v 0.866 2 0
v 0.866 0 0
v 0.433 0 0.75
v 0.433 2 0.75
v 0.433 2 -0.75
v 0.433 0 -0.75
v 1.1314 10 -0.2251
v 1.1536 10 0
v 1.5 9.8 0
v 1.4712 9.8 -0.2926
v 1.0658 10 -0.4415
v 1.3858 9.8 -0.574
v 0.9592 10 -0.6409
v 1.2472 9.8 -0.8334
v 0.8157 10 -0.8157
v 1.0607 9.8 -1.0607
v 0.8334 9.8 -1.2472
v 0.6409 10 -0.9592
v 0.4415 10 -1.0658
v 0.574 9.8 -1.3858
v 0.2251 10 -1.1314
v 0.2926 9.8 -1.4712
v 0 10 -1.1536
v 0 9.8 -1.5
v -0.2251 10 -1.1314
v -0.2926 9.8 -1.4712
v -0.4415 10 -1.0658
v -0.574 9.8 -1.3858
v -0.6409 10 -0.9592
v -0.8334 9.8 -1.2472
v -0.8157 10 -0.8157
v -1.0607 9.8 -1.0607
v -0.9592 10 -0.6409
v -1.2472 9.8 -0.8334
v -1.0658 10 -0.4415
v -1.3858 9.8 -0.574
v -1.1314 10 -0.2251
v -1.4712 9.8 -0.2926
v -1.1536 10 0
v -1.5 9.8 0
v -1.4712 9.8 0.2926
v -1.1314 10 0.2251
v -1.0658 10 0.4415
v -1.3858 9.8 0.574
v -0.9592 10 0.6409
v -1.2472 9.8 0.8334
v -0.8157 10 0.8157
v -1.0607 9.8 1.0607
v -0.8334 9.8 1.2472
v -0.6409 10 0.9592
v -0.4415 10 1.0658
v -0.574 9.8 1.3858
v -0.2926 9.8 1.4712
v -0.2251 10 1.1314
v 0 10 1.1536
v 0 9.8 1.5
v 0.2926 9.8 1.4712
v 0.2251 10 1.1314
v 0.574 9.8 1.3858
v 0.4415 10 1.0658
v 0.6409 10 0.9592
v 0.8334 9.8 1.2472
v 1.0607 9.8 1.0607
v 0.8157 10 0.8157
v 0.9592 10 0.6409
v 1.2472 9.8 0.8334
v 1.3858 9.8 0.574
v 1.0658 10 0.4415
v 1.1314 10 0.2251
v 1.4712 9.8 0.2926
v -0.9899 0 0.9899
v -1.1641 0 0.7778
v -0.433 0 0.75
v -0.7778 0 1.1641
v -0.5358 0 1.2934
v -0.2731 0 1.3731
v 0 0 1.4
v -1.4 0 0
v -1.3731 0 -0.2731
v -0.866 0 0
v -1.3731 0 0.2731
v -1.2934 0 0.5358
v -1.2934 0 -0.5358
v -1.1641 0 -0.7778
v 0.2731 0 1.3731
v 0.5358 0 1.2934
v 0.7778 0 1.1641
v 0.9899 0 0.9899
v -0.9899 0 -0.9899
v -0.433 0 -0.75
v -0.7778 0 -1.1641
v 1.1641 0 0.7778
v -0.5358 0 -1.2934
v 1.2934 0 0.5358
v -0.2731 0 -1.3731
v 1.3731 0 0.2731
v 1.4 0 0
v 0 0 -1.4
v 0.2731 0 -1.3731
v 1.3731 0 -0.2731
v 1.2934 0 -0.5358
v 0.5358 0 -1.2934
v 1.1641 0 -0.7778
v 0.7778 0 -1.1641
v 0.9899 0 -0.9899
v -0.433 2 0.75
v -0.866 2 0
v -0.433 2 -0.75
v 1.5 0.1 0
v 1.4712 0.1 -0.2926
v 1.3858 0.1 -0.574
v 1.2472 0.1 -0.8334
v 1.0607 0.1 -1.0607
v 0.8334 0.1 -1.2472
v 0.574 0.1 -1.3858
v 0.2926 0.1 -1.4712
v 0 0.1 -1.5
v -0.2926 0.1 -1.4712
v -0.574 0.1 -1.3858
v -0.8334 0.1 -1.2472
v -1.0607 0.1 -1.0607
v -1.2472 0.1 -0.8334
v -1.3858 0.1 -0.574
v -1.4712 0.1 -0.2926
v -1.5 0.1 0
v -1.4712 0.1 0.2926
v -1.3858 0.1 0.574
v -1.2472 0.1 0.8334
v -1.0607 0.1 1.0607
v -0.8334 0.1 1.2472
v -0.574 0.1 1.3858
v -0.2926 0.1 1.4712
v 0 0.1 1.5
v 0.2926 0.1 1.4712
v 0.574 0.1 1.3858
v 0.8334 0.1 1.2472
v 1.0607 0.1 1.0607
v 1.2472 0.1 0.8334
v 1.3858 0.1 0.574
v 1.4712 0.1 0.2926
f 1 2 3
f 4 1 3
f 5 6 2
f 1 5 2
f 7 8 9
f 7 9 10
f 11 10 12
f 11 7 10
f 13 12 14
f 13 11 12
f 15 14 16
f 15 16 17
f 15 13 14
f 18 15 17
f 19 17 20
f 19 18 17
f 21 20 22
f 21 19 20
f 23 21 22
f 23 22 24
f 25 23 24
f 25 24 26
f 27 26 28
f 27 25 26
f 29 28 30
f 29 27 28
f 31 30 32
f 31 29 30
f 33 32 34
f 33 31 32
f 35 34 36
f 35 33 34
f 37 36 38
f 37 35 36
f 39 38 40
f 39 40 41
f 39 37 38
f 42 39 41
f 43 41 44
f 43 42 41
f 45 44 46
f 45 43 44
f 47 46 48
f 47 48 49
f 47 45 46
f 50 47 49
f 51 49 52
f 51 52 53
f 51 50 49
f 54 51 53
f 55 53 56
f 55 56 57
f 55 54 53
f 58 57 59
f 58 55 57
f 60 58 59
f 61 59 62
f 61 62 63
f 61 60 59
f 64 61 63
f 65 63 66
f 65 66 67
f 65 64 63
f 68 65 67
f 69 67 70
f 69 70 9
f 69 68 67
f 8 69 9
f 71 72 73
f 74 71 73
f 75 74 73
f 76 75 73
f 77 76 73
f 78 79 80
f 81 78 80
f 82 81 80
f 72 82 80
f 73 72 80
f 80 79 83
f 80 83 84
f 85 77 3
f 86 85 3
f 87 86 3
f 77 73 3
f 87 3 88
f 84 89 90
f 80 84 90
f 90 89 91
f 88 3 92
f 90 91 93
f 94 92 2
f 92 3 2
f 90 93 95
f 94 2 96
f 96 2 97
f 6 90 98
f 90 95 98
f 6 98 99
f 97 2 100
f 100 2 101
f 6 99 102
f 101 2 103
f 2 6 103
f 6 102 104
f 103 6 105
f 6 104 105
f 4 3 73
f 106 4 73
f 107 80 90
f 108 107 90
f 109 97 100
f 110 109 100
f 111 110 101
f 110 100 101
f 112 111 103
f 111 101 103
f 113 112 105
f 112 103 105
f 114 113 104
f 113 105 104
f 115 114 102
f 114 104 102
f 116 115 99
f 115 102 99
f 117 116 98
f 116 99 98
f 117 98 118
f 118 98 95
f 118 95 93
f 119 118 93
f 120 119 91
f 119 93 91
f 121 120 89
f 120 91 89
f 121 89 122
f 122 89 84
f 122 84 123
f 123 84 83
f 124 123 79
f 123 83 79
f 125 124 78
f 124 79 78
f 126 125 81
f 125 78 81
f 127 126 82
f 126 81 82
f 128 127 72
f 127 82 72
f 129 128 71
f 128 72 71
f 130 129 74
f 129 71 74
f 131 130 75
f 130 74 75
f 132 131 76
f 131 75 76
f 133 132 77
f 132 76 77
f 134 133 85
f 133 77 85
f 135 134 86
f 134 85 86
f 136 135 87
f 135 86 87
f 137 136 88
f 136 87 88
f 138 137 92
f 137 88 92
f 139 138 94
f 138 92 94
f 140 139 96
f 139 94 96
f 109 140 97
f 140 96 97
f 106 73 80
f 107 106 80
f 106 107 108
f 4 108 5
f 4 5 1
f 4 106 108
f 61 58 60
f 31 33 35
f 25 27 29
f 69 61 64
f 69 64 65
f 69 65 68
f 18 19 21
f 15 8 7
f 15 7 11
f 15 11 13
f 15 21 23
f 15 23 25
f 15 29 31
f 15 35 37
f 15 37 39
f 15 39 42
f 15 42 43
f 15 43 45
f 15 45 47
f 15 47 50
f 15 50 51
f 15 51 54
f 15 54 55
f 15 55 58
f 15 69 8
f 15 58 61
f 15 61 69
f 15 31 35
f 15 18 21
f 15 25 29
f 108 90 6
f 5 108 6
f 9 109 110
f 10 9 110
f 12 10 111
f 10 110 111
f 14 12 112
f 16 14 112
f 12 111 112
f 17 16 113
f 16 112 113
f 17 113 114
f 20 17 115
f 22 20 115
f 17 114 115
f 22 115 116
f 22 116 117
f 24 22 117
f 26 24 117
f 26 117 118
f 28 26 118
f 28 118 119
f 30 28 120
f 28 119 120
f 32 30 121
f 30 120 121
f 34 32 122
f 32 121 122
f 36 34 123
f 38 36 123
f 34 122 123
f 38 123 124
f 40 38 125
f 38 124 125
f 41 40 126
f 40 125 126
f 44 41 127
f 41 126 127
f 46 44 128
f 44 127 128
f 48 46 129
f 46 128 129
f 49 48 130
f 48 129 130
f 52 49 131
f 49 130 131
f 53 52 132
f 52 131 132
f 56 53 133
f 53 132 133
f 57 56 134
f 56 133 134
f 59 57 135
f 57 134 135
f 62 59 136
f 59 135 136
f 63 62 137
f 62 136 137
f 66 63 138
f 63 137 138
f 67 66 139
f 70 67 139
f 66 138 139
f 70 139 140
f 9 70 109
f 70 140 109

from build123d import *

# Parameters (mm, degrees)
CROQUIS1_R              = 1.5
SALIENTE_EXTRUIR1_DEPTH = 10
CORTAR_EXTRUIR1_DEPTH   = 2
CHAFL_N2_SIZE           = 0.1
CHAFL_N3_SIZE           = 0.2
CHAFL_N3_SIZE2          = 0.346410162


with BuildPart() as part:
    # Croquis1 → Saliente-Extruir1 (new body)
    with BuildSketch(Plane(origin=(0, 0, 0), x_dir=(1, 0, 0), z_dir=(0, 1, 0))):
        Circle(CROQUIS1_R)
    extrude(amount=SALIENTE_EXTRUIR1_DEPTH)

    # Croquis2 → Cortar-Extruir1 (cut)
    with BuildSketch(Plane.XZ):
        Polygon((0.433012702, 0.75), (-0.433012702, 0.75), (-0.866025404, 0), (-0.433012702, -0.75), (0.433012702, -0.75), (0.866025404, 0), align=None)
    extrude(amount=-CORTAR_EXTRUIR1_DEPTH, mode=Mode.SUBTRACT)

    # Chaflán2
    chafl_n2_edges = [part.edges().sort_by_distance(p)[0] for p in [
        (-1.5, 0, 0),
    ]]
    chamfer(chafl_n2_edges, length=CHAFL_N2_SIZE)

    # Chaflán3
    chafl_n3_edges = [part.edges().sort_by_distance(p)[0] for p in [
        (-1.5, 10, 0),
    ]]
    chafl_n3_side = [part.faces().sort_by_distance(p)[0] for p in [
        (-1.5, 5.05, 0),
    ]]
    chamfer(chafl_n3_edges, length=CHAFL_N3_SIZE, length2=CHAFL_N3_SIZE2, reference=chafl_n3_side[0])


solid = part.part
